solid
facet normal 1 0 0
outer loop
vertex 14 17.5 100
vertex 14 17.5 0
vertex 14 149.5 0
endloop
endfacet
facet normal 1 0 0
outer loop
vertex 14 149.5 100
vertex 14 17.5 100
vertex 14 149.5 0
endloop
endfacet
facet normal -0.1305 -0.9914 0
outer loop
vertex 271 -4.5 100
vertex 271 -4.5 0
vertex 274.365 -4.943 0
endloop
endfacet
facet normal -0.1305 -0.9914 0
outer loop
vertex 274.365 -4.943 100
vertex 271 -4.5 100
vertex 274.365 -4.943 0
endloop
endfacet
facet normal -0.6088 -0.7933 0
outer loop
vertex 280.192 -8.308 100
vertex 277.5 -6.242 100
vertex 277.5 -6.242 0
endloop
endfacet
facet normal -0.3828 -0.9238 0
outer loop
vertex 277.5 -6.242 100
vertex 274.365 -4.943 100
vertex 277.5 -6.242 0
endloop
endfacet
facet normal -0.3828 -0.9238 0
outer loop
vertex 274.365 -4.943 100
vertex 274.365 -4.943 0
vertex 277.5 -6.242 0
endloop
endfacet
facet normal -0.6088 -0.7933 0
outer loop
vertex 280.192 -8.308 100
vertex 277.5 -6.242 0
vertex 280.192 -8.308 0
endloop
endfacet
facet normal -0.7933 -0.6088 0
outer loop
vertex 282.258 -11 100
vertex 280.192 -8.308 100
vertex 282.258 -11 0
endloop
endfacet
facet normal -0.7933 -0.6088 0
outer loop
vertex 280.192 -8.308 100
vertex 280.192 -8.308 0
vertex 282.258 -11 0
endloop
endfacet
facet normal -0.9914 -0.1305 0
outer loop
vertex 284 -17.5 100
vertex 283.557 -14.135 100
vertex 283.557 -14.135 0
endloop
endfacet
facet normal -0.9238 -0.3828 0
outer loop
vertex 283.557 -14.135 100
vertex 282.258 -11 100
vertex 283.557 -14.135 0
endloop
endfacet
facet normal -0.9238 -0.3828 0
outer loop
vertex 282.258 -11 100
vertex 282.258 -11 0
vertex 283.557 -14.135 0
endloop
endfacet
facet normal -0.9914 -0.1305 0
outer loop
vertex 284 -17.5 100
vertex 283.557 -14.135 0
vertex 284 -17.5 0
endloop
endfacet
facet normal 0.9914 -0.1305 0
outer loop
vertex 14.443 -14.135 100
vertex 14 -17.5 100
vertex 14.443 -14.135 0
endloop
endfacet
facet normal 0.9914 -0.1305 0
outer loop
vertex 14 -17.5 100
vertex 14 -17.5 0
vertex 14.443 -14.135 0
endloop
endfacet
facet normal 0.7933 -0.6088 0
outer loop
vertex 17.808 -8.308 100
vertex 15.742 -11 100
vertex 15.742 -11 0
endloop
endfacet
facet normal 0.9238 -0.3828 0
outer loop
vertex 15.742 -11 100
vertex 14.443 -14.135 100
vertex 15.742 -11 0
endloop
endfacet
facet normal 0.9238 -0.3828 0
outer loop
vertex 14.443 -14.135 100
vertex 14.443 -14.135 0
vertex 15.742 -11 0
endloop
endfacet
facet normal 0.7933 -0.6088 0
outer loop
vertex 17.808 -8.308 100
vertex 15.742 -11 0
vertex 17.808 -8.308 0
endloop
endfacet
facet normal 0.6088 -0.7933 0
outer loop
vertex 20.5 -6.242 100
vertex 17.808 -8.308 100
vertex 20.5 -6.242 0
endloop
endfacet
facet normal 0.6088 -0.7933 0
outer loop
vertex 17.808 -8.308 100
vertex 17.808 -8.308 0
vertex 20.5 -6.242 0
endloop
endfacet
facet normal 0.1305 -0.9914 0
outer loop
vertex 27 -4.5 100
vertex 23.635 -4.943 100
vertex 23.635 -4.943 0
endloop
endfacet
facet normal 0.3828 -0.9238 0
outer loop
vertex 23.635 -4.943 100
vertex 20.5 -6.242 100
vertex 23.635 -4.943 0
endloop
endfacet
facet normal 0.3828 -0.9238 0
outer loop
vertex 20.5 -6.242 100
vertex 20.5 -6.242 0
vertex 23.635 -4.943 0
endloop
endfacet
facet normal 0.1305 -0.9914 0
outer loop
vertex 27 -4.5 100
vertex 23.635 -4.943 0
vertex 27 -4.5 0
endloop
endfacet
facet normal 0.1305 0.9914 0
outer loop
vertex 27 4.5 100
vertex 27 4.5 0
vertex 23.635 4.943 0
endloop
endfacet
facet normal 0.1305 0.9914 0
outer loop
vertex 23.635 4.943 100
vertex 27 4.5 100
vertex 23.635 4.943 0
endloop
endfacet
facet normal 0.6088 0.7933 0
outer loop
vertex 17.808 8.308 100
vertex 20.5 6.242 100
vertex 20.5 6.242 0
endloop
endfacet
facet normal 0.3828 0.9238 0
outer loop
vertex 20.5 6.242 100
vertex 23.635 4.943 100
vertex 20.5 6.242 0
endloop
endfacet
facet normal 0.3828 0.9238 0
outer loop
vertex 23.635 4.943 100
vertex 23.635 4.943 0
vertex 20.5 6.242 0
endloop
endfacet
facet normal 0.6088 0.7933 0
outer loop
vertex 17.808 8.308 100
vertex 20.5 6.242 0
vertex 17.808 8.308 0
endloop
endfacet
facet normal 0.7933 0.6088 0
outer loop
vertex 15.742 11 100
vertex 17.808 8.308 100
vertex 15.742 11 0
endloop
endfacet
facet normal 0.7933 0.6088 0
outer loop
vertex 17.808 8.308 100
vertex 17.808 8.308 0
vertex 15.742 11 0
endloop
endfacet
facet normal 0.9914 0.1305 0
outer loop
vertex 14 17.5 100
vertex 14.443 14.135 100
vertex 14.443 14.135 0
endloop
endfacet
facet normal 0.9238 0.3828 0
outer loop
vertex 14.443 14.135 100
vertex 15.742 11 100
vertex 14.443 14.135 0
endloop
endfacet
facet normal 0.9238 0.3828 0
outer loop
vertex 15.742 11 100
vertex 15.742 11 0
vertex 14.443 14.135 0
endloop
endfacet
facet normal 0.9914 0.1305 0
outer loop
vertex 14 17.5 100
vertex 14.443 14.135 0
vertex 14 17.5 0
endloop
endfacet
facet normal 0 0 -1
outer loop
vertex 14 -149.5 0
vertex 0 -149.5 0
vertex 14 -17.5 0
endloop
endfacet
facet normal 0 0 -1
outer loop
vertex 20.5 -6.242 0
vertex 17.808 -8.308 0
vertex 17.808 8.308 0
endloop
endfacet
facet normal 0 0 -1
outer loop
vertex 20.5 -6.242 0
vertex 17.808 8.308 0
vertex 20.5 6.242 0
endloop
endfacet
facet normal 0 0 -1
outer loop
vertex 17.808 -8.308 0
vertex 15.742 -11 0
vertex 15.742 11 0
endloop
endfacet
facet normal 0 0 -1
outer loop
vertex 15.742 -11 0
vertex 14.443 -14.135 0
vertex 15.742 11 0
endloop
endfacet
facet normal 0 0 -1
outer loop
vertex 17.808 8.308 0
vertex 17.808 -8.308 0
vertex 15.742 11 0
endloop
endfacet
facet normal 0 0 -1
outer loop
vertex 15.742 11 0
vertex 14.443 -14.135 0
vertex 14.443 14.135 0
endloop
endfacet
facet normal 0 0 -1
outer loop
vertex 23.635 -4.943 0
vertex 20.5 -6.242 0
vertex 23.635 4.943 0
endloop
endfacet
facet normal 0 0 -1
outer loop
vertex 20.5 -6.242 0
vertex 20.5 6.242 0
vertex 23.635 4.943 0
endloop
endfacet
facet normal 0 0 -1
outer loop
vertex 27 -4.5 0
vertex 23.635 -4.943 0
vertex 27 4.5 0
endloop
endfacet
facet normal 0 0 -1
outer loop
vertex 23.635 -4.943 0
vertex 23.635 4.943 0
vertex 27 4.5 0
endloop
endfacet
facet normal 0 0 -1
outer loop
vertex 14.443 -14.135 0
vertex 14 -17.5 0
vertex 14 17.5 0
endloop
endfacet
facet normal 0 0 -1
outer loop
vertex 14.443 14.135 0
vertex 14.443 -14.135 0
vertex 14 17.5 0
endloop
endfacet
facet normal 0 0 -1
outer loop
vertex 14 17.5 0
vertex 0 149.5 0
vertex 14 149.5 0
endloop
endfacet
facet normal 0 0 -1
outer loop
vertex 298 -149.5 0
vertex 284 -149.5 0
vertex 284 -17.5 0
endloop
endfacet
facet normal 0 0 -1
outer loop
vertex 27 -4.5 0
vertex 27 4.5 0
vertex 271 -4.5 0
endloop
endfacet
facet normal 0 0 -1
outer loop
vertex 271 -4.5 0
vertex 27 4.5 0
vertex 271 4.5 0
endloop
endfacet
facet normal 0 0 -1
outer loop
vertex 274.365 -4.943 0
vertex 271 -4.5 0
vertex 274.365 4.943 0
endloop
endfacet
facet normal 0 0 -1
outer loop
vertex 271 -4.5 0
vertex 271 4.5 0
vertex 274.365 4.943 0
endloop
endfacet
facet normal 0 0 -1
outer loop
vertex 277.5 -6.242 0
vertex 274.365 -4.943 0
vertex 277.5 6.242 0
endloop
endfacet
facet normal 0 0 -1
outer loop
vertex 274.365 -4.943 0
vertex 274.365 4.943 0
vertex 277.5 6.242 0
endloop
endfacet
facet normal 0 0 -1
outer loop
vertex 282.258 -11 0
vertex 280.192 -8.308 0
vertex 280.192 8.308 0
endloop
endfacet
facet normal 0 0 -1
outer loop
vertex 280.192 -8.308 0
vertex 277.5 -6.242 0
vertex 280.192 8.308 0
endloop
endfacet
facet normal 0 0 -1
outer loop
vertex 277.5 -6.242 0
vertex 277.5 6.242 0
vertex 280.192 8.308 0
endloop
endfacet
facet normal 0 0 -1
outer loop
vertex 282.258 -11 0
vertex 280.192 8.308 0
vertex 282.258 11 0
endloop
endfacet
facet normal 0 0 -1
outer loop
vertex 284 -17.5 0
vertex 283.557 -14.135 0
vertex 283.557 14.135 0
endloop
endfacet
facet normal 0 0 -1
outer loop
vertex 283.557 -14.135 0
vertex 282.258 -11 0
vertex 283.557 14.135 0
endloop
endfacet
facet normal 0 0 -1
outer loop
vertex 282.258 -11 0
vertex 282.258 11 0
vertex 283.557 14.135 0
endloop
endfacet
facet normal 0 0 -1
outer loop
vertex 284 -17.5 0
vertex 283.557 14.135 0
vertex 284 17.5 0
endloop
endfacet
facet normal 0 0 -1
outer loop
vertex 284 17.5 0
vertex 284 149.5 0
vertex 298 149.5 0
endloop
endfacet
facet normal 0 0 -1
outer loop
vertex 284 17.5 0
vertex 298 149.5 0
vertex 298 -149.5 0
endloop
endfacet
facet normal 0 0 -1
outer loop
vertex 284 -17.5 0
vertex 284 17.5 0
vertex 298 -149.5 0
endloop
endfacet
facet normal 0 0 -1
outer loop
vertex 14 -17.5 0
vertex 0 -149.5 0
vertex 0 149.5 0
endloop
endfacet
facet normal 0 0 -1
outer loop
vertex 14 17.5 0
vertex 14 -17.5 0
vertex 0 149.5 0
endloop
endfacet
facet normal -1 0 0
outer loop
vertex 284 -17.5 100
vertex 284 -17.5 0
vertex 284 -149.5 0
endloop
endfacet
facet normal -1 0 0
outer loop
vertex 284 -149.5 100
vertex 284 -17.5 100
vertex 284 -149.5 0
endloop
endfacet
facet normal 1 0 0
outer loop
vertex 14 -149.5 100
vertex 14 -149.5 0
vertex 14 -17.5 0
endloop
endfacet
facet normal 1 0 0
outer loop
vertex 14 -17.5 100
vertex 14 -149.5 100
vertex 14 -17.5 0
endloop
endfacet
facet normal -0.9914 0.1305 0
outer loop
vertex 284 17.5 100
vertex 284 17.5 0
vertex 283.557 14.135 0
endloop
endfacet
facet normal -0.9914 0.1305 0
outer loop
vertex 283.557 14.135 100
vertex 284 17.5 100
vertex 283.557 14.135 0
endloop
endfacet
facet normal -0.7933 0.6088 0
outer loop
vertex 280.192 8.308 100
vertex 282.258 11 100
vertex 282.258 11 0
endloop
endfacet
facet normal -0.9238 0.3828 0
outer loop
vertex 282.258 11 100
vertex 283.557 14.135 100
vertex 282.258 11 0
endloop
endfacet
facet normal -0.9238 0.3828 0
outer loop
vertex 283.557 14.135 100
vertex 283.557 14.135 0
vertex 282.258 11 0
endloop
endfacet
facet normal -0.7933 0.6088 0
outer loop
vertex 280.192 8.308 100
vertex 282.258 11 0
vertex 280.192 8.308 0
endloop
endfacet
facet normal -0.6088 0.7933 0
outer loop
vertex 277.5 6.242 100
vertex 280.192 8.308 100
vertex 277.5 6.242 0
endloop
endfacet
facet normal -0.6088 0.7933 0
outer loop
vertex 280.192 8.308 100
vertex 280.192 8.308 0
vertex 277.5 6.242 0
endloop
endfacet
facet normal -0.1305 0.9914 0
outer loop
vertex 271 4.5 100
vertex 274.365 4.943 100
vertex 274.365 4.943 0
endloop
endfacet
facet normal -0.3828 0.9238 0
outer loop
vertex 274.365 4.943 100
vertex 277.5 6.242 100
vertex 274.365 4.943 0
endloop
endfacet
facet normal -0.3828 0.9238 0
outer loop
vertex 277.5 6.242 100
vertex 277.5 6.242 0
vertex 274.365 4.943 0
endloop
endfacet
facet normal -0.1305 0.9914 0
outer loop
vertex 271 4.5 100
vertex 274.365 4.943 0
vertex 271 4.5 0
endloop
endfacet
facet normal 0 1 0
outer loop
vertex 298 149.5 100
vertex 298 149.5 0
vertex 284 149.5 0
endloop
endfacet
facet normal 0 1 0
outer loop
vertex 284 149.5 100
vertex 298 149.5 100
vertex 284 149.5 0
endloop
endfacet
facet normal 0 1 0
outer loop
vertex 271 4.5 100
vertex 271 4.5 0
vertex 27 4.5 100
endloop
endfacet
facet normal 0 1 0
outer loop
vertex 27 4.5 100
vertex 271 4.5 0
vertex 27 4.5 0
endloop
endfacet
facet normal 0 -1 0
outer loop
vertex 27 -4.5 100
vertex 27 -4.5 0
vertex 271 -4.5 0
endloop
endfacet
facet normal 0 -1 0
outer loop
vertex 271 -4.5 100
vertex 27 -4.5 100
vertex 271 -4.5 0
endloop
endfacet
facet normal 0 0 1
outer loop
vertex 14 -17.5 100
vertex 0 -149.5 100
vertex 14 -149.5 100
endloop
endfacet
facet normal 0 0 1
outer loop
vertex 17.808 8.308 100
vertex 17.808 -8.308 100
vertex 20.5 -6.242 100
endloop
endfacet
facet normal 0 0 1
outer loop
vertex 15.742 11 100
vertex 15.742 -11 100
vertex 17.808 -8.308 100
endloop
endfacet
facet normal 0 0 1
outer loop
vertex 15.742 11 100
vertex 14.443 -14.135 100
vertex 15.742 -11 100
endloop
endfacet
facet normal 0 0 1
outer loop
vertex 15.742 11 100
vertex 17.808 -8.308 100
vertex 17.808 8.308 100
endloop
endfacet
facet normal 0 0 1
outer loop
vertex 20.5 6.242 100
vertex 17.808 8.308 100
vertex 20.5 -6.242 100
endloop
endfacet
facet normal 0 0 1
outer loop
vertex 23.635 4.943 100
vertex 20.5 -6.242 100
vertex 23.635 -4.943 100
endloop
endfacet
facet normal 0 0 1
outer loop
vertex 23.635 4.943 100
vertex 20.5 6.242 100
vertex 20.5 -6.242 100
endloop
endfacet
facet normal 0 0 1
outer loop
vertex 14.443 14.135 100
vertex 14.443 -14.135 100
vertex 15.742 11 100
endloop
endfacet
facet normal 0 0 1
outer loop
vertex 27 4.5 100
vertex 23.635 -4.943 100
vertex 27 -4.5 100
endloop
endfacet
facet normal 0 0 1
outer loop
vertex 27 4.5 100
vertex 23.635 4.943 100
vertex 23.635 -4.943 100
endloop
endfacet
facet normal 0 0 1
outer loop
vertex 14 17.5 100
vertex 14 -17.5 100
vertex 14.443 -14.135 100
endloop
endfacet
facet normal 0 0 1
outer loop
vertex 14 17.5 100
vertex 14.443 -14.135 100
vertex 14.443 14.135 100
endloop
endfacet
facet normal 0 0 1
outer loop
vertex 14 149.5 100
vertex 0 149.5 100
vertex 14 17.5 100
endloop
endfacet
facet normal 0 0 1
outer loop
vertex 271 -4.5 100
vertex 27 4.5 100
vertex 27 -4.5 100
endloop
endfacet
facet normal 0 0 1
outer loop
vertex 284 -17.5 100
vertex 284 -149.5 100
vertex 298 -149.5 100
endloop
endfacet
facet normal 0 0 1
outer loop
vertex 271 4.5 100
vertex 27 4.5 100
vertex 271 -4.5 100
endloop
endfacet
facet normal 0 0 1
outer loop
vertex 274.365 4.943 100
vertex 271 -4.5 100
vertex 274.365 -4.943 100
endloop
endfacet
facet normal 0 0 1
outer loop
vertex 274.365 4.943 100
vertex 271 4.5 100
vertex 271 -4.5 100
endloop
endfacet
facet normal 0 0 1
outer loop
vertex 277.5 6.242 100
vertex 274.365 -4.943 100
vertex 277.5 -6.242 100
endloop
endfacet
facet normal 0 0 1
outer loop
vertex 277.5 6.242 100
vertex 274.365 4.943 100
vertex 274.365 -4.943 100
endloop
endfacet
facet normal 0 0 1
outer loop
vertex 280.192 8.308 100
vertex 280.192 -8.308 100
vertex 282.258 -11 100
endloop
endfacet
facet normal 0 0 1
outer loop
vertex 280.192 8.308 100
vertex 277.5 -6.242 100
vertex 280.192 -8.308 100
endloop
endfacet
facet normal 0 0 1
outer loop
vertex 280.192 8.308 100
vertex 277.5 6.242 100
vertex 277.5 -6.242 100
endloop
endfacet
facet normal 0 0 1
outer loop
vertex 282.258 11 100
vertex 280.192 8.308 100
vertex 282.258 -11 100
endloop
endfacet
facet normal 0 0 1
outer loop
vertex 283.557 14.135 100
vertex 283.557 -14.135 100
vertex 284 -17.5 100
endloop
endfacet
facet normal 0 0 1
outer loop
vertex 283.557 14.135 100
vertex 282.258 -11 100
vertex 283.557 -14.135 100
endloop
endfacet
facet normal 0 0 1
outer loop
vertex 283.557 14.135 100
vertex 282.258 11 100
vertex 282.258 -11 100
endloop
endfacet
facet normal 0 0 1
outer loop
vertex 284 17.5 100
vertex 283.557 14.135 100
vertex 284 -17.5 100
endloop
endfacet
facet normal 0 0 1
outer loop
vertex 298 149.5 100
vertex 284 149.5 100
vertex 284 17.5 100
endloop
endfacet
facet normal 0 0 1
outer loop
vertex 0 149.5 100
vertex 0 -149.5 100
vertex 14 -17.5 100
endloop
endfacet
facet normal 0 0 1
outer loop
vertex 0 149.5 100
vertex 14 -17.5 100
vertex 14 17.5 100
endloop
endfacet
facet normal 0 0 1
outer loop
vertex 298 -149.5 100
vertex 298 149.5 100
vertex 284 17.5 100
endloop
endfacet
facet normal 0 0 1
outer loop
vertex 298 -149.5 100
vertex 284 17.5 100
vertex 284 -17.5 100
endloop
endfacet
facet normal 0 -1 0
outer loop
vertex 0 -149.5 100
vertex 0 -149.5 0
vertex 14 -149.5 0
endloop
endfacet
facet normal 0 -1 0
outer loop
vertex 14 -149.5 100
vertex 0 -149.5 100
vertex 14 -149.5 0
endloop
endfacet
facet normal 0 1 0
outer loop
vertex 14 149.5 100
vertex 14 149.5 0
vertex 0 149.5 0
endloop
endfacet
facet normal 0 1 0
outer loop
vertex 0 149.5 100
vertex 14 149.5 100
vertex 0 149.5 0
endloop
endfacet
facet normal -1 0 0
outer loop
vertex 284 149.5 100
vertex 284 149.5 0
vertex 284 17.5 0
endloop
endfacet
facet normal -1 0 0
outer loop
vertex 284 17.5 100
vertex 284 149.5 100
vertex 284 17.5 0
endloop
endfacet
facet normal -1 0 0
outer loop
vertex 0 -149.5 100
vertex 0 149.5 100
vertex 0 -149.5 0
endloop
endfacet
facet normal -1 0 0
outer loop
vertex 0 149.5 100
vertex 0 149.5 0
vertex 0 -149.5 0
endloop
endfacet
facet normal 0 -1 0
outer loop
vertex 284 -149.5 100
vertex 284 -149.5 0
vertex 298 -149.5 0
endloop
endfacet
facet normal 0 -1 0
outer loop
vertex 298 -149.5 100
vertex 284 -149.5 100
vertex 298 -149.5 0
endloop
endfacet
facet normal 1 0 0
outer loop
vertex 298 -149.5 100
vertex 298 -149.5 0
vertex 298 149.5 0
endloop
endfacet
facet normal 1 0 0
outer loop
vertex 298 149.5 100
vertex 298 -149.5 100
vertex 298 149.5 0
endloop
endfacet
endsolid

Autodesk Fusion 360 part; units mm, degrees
sketch "スケッチ1" plane through (0, 0, 0) normal (0, 0, 1) x (1, 0, 0)
  line L0 (298, 149.5) -> (284, 149.5)
  line L1 (284, -149.5) -> (298, -149.5)
  line L2 (0, 149.5) -> (0, -149.5)
  line L3 (14, 17.5) -> (14, 149.5)
  line L4 (284, 149.5) -> (284, 17.5)
  line L5 (284, -17.5) -> (284, -149.5)
  line L6 (14, -149.5) -> (14, -17.5)
  line L7 (0, -149.5) -> (14, -149.5)
  line L8 (271, 4.5) -> (27, 4.5)
  line L9 (27, -4.5) -> (271, -4.5)
  line L10 (14, 149.5) -> (0, 149.5)
  line L11 (298, -149.5) -> (298, 149.5)
  arc A0 (27, -4.5) -> (14, -17.5) centre (27, -17.5) ccw
  arc A1 (14, 17.5) -> (27, 4.5) centre (27, 17.5) ccw
  arc A2 (271, 4.5) -> (284, 17.5) centre (271, 17.5) ccw
  arc A3 (284, -17.5) -> (271, -4.5) centre (271, -17.5) ccw
extrude "押し出し1" add sketch "スケッチ1" along normal blind 100
